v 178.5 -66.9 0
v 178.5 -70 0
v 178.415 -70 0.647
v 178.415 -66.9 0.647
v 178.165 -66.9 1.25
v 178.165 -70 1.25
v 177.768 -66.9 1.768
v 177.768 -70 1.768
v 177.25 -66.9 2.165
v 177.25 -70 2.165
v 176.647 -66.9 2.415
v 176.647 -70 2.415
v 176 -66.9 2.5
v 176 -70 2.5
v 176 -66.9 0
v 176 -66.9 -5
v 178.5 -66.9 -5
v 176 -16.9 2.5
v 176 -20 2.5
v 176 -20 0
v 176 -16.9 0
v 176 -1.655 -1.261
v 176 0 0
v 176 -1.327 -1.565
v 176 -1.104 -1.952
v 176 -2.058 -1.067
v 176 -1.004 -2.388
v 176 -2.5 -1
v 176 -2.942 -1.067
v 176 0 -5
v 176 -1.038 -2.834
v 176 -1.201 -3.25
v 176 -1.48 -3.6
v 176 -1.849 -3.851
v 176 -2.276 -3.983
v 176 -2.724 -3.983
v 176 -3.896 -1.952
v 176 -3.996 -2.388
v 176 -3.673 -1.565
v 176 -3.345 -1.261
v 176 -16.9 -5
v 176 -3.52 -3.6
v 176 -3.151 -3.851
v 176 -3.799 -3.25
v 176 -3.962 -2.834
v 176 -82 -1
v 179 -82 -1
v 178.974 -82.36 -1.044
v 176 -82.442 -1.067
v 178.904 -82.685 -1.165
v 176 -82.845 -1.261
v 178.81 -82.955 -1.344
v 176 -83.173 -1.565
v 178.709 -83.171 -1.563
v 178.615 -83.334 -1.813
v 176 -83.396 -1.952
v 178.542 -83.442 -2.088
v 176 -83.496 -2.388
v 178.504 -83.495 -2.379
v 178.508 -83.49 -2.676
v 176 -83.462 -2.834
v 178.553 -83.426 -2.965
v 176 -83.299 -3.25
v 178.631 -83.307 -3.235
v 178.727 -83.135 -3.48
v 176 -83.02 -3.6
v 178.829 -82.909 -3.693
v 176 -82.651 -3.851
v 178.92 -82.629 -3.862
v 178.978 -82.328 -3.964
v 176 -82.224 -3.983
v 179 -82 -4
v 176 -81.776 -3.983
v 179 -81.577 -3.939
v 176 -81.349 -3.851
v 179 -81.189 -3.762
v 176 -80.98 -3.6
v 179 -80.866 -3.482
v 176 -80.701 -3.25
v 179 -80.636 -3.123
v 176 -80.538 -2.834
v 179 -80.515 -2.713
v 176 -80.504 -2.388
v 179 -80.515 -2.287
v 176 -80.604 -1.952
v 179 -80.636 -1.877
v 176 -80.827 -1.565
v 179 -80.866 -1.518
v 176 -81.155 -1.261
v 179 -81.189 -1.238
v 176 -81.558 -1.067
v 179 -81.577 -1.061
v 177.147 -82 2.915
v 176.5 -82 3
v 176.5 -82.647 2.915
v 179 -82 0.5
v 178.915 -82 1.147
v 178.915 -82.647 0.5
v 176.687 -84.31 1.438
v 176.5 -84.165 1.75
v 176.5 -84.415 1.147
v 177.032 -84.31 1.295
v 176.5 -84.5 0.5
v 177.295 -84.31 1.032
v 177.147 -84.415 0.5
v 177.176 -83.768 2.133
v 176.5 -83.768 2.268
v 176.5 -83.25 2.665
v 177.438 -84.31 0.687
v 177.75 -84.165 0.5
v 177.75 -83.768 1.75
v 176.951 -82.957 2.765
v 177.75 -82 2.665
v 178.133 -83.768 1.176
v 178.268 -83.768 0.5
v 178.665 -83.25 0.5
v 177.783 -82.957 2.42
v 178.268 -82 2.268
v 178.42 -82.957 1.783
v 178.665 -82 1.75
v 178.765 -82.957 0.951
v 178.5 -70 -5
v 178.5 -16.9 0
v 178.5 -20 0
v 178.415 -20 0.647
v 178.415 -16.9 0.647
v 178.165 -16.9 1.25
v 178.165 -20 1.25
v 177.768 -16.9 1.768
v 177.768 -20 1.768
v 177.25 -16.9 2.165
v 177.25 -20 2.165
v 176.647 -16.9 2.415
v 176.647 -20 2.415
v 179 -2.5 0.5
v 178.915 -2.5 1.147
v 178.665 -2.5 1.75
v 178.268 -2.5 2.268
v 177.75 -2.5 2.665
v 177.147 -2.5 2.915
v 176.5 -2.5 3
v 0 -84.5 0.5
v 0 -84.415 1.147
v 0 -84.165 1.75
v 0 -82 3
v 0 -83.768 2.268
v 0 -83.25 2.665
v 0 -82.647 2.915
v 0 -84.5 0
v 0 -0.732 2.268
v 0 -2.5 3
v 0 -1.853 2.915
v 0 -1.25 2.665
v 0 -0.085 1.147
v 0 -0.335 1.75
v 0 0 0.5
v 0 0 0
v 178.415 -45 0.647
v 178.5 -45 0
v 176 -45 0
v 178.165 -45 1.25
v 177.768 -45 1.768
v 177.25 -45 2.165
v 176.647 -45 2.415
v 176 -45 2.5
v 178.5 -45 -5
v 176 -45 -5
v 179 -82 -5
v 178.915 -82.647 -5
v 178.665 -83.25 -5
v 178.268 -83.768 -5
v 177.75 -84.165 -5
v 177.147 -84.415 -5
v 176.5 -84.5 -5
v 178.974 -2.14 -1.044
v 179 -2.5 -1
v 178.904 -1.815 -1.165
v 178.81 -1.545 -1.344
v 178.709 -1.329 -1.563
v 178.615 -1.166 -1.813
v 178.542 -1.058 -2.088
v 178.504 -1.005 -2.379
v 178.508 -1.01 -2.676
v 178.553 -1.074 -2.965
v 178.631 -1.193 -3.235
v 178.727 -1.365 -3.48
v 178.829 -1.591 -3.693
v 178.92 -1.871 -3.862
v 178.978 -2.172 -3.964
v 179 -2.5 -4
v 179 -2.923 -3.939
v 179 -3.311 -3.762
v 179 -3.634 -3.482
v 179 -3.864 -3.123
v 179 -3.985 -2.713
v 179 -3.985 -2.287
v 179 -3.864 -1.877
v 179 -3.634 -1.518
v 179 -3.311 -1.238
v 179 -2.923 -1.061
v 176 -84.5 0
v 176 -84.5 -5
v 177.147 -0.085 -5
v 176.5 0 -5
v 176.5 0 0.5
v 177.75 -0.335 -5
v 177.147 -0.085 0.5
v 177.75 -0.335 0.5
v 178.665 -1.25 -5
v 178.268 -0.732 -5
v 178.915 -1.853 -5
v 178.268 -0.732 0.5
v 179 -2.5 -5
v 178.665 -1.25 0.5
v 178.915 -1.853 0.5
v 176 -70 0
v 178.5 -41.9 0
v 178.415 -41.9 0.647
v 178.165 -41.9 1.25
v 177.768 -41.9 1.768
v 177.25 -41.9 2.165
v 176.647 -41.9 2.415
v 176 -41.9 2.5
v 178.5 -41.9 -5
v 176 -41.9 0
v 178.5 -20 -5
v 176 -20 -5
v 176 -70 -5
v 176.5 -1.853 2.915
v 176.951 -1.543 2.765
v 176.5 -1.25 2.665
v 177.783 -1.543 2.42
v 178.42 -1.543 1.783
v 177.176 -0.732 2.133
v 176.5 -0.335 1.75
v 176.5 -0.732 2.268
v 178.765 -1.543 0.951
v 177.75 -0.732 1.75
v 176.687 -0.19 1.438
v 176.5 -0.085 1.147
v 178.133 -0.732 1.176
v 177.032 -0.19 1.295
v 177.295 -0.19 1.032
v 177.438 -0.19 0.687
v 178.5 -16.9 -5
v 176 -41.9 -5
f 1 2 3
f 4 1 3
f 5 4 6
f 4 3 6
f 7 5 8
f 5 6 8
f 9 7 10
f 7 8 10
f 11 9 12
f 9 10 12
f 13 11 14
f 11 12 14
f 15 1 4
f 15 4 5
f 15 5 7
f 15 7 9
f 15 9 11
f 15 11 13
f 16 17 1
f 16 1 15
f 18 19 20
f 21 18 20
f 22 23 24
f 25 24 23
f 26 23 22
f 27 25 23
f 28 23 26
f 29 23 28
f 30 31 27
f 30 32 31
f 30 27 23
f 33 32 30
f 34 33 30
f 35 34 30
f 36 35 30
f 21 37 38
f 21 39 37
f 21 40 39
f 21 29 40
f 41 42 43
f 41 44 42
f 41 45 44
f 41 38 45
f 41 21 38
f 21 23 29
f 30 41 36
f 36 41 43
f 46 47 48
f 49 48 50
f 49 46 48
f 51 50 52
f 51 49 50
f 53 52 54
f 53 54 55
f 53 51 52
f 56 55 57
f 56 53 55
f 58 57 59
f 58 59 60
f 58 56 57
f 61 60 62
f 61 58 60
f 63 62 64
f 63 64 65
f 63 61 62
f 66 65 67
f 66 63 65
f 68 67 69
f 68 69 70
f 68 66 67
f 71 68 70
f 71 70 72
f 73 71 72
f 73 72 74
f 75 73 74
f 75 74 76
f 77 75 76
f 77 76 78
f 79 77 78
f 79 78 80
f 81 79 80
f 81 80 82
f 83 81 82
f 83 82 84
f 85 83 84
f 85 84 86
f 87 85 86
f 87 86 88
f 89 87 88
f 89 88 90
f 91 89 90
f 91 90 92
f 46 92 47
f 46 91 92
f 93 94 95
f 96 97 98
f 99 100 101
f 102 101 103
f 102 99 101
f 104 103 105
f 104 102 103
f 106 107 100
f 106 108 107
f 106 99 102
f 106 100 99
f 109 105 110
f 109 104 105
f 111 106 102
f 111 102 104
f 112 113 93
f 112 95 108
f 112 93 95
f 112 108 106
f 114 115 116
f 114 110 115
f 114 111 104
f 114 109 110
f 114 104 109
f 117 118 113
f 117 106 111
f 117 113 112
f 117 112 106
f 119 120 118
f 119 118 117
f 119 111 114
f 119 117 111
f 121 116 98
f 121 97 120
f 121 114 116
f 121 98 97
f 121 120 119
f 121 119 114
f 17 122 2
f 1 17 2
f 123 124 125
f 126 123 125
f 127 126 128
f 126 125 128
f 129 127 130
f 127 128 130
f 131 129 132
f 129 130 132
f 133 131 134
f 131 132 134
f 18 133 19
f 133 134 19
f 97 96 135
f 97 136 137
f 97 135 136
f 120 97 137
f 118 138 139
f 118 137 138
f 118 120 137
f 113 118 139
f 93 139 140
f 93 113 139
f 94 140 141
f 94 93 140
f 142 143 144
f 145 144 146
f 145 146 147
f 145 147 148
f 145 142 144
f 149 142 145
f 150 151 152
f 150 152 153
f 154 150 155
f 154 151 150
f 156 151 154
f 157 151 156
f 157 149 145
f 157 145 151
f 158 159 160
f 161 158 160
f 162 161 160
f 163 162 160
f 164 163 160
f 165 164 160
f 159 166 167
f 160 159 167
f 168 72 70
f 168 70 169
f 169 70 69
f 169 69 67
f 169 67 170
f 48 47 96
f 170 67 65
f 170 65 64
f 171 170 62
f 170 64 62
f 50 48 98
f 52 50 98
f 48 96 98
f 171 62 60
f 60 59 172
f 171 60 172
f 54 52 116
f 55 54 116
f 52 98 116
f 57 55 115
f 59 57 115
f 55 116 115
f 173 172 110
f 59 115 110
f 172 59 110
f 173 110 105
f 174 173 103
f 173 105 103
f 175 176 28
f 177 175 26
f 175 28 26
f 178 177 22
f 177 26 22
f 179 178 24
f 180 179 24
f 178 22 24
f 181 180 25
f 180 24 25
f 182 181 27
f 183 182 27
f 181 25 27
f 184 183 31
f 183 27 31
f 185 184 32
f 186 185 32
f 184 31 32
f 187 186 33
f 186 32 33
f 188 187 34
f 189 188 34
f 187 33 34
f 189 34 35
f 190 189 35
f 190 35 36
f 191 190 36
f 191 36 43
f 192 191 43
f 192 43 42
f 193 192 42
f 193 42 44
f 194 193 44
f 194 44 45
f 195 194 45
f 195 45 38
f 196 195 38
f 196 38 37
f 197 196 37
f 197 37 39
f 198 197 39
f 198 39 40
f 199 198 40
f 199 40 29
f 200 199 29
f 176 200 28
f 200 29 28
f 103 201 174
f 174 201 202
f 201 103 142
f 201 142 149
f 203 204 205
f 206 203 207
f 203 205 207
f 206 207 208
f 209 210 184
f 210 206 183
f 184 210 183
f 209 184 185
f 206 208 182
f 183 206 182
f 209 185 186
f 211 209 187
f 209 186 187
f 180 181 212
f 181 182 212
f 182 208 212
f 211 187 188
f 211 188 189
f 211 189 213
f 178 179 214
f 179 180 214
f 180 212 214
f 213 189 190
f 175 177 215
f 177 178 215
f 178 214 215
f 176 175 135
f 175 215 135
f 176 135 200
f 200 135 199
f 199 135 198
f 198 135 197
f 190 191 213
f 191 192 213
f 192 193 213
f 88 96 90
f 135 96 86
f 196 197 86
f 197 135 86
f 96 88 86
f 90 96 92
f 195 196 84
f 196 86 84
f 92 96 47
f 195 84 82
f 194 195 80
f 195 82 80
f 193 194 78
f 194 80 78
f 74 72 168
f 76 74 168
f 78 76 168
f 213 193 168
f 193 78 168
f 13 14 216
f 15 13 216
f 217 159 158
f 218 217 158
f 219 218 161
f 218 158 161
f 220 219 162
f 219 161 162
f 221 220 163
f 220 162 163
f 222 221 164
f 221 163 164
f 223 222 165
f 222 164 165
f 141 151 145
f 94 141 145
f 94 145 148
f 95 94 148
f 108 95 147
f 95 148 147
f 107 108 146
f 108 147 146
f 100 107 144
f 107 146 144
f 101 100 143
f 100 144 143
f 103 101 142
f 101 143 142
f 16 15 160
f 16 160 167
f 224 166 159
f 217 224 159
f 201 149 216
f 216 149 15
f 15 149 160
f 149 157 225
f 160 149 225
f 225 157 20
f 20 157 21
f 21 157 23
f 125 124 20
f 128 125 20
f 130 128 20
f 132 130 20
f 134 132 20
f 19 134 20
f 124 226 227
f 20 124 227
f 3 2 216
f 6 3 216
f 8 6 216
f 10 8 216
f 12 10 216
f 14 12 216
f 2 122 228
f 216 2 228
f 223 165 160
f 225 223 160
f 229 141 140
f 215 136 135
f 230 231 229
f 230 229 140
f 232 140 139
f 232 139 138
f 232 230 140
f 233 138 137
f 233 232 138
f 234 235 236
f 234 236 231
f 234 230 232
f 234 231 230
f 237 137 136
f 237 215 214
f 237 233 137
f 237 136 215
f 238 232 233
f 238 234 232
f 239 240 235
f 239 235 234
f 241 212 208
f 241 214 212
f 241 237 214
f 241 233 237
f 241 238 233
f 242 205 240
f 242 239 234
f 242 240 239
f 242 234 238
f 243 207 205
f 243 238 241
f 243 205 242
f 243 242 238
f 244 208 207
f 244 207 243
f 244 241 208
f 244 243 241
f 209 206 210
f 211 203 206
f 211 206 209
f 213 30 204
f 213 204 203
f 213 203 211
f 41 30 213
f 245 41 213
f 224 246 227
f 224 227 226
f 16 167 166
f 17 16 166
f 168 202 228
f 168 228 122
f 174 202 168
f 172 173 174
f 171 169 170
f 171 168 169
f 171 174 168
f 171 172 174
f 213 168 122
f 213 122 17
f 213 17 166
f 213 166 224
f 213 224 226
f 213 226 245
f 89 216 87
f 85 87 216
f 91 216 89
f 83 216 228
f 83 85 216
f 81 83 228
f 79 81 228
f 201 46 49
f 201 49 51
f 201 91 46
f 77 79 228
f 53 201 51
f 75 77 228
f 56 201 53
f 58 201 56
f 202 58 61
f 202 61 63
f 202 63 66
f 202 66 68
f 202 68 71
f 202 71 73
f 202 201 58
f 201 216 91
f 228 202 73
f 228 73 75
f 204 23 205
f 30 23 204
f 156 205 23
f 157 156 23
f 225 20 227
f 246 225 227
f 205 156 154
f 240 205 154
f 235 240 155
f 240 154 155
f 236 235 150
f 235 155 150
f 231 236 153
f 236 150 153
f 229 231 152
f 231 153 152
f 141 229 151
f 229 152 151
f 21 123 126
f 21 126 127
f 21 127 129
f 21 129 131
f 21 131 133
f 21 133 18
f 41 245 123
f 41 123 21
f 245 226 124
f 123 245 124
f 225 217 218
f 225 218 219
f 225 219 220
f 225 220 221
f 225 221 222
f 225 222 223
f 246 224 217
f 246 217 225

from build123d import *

# Parameters (mm, degrees)
SKETCH1_W           = 176
SKETCH1_H           = 84.5
BOSS_EXTRUDE1_DEPTH = 3
SKETCH2_W           = 8
SKETCH2_H           = 5
BOSS_EXTRUDE2_DEPTH = 3
SKETCH3_R           = 1.5
CUT_EXTRUDE1_DEPTH  = 3
SKETCH4_W           = 3
SKETCH4_H           = 8
BOSS_EXTRUDE3_DEPTH = 74.5
CUT_EXTRUDE2_DEPTH  = 3.1
FILLET3_R           = 2.5
FILLET4_R           = 2.5
FILLET7_R           = 2.5
LPATTERN1_COUNT     = 3
LPATTERN1_PITCH     = 25


with BuildPart() as part:
    # Sketch1 → Boss-Extrude1 (new body)
    with BuildSketch(Plane.XY):
        with Locations((88, -42.25)):
            Rectangle(SKETCH1_W, SKETCH1_H)
    extrude(amount=BOSS_EXTRUDE1_DEPTH)

    # Sketch2 → Boss-Extrude2 (add)
    with BuildSketch(Plane(origin=(176, 0, 0), x_dir=(0, 0, -1), z_dir=(1, 0, 0))):
        with Locations((1, -2.5)):
            Rectangle(SKETCH2_W, SKETCH2_H)
    boss_extrude2 = extrude(amount=BOSS_EXTRUDE2_DEPTH)

    # Sketch3 → Cut-Extrude1 (cut)
    with BuildSketch(Plane.ZY.offset(-176)):
        with Locations((-2.5, -2.5)):
            Circle(SKETCH3_R)
    cut_extrude1 = extrude(amount=-CUT_EXTRUDE1_DEPTH, mode=Mode.SUBTRACT)

    # Mirror3: Boss-Extrude2, Cut-Extrude1 across plane
    add(boss_extrude2.mirror(Plane(origin=(0, -42.25, 0), x_dir=(0, 0, 1), z_dir=(0, -1, 0))))
    add(cut_extrude1.mirror(Plane(origin=(0, -42.25, 0), x_dir=(0, 0, 1), z_dir=(0, -1, 0))), mode=Mode.SUBTRACT)

    # Sketch4 → Boss-Extrude3 (add)
    with BuildSketch(Plane(origin=(0, -79.5, 0), x_dir=(1, 0, 0), z_dir=(0, 1, 0))):
        with Locations((177.5, 1)):
            Rectangle(SKETCH4_W, SKETCH4_H)
    extrude(amount=BOSS_EXTRUDE3_DEPTH)

    # Sketch12 → Cut-Extrude2 (cut)
    with BuildSketch(Plane(origin=(0, -70, 0), x_dir=(-1, 0, 0), z_dir=(0, -1, 0))):
        with BuildLine():
            Line((-176, -2.5), (-176, 0))
            Line((-176, 0), (-176, 5))
            Line((-176, 5), (-178.5, 5))
            Line((-178.5, 5), (-178.5, 0))
            ThreePointArc((-178.5, 0), (-177.767766953, -1.767766953), (-176, -2.5))
        make_face()
    cut_extrude2 = extrude(amount=-CUT_EXTRUDE2_DEPTH, mode=Mode.SUBTRACT)

    # Fillet3
    fillet3_edges = [part.edges().sort_by_distance(p)[0] for p in [
        (179, -42.25, 3),
    ]]
    fillet(fillet3_edges, radius=FILLET3_R)

    # Fillet4
    # the kernel refuses this fillet: 2.5 mm, written as the material it takes off along each edge
    with BuildSketch(Plane(origin=(179, -84.5, 0.5), x_dir=(0, 1, 0), z_dir=(0, 0, -1))) as fillet4_piece_1:
        with BuildLine():
            CenterArc((FILLET4_R, -FILLET4_R), FILLET4_R, 90, 90)
            Line((0, -FILLET4_R), (0, 0))
            Line((0, 0), (FILLET4_R, 0))
        make_face()
    extrude(amount=11.75, mode=Mode.SUBTRACT)
    with BuildSketch(Plane(origin=(176.5, -84.5, 0.5), x_dir=(0, 0, 1), z_dir=(-1, 0, 0))) as fillet4_piece_2:
        with BuildLine():
            CenterArc((2.5 - FILLET4_R, FILLET4_R), FILLET4_R, 270, 90)
            Line((2.5 - FILLET4_R, 0), (2.5, 0))
            Line((2.5, 0), (2.5, FILLET4_R))
        make_face()
    revolve(axis=Axis((176.5, -84.5, 0.5), (0, 1, 0)), revolution_arc=90, mode=Mode.SUBTRACT)
    with BuildSketch(Plane(origin=(-6.25, -84.5, 3), x_dir=(0, 1, 0), z_dir=(1, 0, 0))) as fillet4_piece_3:
        with BuildLine():
            CenterArc((FILLET4_R, -FILLET4_R), FILLET4_R, 90, 90)
            Line((0, -FILLET4_R), (0, 0))
            Line((0, 0), (FILLET4_R, 0))
        make_face()
    extrude(amount=182.75, mode=Mode.SUBTRACT)

    # Fillet7
    # the kernel refuses this fillet: 2.5 mm, written as the material it takes off along each edge
    with BuildSketch(Plane(origin=(179, 0, 0.5), x_dir=(-1, 0, 0), z_dir=(0, 0, -1))) as fillet7_piece_1:
        with BuildLine():
            CenterArc((FILLET7_R, -FILLET7_R), FILLET7_R, 90, 90)
            Line((0, -FILLET7_R), (0, 0))
            Line((0, 0), (FILLET7_R, 0))
        make_face()
    extrude(amount=11.75, mode=Mode.SUBTRACT)
    with BuildSketch(Plane(origin=(-6.25, 0, 3), x_dir=(0, 0, -1), z_dir=(1, 0, 0))) as fillet7_piece_2:
        with BuildLine():
            CenterArc((FILLET7_R, -FILLET7_R), FILLET7_R, 90, 90)
            Line((0, -FILLET7_R), (0, 0))
            Line((0, 0), (FILLET7_R, 0))
        make_face()
    extrude(amount=182.75, mode=Mode.SUBTRACT)
    with BuildSketch(Plane(origin=(176.5, 0, 0.5), x_dir=(0, 0, 1), z_dir=(-1, 0, 0))) as fillet7_piece_3:
        with BuildLine():
            CenterArc((2.5 - FILLET7_R, -FILLET7_R), FILLET7_R, 0, 90)
            Line((2.5, -FILLET7_R), (2.5, 0))
            Line((2.5, 0), (2.5 - FILLET7_R, 0))
        make_face()
    revolve(axis=Axis((176.5, 0, 0.5), (0, 1, 0)), revolution_arc=90, mode=Mode.SUBTRACT)

    # LPattern1: Cut-Extrude2 ×3
    with Locations(*[(0, i * LPATTERN1_PITCH, 0) for i in range(1, LPATTERN1_COUNT)]):
        add(cut_extrude2, mode=Mode.SUBTRACT)


solid = part.part
